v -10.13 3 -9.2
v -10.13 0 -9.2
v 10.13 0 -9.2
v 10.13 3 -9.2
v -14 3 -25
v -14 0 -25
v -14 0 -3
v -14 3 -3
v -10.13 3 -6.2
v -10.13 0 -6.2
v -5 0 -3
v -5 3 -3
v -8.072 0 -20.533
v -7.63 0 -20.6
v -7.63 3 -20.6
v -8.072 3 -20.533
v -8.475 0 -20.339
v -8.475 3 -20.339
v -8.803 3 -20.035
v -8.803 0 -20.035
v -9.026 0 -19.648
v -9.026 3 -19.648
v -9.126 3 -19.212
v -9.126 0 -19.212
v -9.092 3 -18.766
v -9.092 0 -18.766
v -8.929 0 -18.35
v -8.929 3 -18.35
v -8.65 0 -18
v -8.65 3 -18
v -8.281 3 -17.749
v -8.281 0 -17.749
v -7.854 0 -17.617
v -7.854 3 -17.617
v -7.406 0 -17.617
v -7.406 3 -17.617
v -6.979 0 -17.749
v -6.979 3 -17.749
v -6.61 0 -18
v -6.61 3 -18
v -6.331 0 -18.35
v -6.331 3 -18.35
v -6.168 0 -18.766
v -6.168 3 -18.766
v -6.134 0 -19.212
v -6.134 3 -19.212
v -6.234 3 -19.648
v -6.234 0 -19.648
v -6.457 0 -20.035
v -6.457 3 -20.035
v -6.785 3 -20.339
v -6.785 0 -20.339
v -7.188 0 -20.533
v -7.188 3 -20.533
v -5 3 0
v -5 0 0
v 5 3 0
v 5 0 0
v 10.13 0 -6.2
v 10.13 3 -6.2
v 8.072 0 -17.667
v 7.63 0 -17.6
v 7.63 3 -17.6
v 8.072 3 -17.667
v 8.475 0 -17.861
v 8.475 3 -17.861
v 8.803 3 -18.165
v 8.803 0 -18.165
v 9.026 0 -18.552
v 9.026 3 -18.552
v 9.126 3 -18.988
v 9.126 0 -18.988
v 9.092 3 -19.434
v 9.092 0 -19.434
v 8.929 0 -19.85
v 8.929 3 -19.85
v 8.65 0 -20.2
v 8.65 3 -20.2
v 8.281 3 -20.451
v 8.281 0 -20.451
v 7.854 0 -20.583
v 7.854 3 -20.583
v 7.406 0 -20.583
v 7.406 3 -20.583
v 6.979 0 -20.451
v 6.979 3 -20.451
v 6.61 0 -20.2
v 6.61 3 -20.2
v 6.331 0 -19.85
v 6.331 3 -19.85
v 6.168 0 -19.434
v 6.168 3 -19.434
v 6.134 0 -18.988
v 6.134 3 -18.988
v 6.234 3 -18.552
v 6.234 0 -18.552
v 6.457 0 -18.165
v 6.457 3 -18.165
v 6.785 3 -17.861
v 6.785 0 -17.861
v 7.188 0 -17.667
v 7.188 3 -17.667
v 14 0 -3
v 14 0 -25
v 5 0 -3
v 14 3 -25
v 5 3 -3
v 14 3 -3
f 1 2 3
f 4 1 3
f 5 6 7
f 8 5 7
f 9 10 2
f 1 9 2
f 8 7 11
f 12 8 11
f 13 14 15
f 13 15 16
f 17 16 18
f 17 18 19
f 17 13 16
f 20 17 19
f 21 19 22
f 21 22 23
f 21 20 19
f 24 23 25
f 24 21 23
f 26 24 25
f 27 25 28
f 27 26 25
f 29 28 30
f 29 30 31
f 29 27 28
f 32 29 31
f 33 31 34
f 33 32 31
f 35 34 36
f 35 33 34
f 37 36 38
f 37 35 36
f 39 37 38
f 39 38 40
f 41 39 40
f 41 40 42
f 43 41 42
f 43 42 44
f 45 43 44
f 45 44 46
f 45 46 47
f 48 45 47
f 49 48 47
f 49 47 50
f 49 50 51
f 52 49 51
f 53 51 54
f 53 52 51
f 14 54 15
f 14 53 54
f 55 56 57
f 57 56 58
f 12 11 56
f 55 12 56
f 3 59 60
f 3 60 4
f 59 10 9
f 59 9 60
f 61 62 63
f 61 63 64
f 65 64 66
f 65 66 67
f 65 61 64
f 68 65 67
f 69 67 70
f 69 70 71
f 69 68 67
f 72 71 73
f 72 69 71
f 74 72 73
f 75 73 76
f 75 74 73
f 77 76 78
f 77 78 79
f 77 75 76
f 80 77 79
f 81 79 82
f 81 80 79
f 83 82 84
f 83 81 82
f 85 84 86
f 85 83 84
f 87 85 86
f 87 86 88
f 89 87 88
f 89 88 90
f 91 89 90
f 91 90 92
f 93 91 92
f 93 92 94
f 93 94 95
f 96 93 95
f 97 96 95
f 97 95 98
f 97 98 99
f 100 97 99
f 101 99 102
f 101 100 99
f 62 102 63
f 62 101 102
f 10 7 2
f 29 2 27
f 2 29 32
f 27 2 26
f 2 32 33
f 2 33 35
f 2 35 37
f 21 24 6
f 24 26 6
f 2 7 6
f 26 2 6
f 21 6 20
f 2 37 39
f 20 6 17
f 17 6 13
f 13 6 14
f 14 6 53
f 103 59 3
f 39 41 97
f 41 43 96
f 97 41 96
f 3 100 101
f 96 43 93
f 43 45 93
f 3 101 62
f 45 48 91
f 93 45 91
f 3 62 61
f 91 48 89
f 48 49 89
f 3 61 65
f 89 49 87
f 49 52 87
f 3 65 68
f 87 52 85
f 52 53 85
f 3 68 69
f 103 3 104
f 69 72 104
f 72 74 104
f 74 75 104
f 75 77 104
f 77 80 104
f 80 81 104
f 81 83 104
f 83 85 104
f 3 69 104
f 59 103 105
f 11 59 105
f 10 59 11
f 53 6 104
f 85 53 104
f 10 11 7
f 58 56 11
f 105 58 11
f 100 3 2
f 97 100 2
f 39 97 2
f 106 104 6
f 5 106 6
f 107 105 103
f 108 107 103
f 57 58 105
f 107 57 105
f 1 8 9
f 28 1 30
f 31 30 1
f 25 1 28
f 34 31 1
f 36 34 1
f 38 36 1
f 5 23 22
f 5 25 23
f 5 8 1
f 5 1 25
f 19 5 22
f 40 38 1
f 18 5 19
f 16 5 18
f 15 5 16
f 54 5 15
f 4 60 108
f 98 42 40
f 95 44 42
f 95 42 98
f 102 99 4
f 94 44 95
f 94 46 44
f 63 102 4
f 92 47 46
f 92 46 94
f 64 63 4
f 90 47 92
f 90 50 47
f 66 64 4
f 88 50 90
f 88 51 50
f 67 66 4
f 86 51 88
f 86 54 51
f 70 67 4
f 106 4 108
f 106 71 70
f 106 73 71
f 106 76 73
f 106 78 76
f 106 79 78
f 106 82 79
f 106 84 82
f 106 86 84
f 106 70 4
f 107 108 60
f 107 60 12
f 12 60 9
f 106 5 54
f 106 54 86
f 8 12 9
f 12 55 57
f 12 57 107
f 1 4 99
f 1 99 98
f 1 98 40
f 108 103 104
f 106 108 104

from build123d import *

# Parameters (mm, degrees)
SKETCH1_R           = 1.5
SKETCH1_W           = 20.26
SKETCH1_H           = 3
BOSS_EXTRUDE1_DEPTH = 3


with BuildPart() as part:
    # Sketch1 → Boss-Extrude1 (new body)
    with BuildSketch(Plane(origin=(0, 0, 0), x_dir=(1, 0, 0), z_dir=(0, 1, 0))):
        Polygon((-5, 0), (5, 0), (5, 3), (14, 3), (14, 25), (-14, 25), (-14, 3), (-5, 3), align=None)
        with Locations(Location((7.63, 19.1, 0), (0, 0, 270))):
            Circle(SKETCH1_R, mode=Mode.SUBTRACT)
        with Locations(Location((-7.63, 19.1, 0), (0, 0, 90))):
            Circle(SKETCH1_R, mode=Mode.SUBTRACT)
        with Locations((0, 7.7)):
            Rectangle(SKETCH1_W, SKETCH1_H, mode=Mode.SUBTRACT)
    extrude(amount=BOSS_EXTRUDE1_DEPTH)


solid = part.part
